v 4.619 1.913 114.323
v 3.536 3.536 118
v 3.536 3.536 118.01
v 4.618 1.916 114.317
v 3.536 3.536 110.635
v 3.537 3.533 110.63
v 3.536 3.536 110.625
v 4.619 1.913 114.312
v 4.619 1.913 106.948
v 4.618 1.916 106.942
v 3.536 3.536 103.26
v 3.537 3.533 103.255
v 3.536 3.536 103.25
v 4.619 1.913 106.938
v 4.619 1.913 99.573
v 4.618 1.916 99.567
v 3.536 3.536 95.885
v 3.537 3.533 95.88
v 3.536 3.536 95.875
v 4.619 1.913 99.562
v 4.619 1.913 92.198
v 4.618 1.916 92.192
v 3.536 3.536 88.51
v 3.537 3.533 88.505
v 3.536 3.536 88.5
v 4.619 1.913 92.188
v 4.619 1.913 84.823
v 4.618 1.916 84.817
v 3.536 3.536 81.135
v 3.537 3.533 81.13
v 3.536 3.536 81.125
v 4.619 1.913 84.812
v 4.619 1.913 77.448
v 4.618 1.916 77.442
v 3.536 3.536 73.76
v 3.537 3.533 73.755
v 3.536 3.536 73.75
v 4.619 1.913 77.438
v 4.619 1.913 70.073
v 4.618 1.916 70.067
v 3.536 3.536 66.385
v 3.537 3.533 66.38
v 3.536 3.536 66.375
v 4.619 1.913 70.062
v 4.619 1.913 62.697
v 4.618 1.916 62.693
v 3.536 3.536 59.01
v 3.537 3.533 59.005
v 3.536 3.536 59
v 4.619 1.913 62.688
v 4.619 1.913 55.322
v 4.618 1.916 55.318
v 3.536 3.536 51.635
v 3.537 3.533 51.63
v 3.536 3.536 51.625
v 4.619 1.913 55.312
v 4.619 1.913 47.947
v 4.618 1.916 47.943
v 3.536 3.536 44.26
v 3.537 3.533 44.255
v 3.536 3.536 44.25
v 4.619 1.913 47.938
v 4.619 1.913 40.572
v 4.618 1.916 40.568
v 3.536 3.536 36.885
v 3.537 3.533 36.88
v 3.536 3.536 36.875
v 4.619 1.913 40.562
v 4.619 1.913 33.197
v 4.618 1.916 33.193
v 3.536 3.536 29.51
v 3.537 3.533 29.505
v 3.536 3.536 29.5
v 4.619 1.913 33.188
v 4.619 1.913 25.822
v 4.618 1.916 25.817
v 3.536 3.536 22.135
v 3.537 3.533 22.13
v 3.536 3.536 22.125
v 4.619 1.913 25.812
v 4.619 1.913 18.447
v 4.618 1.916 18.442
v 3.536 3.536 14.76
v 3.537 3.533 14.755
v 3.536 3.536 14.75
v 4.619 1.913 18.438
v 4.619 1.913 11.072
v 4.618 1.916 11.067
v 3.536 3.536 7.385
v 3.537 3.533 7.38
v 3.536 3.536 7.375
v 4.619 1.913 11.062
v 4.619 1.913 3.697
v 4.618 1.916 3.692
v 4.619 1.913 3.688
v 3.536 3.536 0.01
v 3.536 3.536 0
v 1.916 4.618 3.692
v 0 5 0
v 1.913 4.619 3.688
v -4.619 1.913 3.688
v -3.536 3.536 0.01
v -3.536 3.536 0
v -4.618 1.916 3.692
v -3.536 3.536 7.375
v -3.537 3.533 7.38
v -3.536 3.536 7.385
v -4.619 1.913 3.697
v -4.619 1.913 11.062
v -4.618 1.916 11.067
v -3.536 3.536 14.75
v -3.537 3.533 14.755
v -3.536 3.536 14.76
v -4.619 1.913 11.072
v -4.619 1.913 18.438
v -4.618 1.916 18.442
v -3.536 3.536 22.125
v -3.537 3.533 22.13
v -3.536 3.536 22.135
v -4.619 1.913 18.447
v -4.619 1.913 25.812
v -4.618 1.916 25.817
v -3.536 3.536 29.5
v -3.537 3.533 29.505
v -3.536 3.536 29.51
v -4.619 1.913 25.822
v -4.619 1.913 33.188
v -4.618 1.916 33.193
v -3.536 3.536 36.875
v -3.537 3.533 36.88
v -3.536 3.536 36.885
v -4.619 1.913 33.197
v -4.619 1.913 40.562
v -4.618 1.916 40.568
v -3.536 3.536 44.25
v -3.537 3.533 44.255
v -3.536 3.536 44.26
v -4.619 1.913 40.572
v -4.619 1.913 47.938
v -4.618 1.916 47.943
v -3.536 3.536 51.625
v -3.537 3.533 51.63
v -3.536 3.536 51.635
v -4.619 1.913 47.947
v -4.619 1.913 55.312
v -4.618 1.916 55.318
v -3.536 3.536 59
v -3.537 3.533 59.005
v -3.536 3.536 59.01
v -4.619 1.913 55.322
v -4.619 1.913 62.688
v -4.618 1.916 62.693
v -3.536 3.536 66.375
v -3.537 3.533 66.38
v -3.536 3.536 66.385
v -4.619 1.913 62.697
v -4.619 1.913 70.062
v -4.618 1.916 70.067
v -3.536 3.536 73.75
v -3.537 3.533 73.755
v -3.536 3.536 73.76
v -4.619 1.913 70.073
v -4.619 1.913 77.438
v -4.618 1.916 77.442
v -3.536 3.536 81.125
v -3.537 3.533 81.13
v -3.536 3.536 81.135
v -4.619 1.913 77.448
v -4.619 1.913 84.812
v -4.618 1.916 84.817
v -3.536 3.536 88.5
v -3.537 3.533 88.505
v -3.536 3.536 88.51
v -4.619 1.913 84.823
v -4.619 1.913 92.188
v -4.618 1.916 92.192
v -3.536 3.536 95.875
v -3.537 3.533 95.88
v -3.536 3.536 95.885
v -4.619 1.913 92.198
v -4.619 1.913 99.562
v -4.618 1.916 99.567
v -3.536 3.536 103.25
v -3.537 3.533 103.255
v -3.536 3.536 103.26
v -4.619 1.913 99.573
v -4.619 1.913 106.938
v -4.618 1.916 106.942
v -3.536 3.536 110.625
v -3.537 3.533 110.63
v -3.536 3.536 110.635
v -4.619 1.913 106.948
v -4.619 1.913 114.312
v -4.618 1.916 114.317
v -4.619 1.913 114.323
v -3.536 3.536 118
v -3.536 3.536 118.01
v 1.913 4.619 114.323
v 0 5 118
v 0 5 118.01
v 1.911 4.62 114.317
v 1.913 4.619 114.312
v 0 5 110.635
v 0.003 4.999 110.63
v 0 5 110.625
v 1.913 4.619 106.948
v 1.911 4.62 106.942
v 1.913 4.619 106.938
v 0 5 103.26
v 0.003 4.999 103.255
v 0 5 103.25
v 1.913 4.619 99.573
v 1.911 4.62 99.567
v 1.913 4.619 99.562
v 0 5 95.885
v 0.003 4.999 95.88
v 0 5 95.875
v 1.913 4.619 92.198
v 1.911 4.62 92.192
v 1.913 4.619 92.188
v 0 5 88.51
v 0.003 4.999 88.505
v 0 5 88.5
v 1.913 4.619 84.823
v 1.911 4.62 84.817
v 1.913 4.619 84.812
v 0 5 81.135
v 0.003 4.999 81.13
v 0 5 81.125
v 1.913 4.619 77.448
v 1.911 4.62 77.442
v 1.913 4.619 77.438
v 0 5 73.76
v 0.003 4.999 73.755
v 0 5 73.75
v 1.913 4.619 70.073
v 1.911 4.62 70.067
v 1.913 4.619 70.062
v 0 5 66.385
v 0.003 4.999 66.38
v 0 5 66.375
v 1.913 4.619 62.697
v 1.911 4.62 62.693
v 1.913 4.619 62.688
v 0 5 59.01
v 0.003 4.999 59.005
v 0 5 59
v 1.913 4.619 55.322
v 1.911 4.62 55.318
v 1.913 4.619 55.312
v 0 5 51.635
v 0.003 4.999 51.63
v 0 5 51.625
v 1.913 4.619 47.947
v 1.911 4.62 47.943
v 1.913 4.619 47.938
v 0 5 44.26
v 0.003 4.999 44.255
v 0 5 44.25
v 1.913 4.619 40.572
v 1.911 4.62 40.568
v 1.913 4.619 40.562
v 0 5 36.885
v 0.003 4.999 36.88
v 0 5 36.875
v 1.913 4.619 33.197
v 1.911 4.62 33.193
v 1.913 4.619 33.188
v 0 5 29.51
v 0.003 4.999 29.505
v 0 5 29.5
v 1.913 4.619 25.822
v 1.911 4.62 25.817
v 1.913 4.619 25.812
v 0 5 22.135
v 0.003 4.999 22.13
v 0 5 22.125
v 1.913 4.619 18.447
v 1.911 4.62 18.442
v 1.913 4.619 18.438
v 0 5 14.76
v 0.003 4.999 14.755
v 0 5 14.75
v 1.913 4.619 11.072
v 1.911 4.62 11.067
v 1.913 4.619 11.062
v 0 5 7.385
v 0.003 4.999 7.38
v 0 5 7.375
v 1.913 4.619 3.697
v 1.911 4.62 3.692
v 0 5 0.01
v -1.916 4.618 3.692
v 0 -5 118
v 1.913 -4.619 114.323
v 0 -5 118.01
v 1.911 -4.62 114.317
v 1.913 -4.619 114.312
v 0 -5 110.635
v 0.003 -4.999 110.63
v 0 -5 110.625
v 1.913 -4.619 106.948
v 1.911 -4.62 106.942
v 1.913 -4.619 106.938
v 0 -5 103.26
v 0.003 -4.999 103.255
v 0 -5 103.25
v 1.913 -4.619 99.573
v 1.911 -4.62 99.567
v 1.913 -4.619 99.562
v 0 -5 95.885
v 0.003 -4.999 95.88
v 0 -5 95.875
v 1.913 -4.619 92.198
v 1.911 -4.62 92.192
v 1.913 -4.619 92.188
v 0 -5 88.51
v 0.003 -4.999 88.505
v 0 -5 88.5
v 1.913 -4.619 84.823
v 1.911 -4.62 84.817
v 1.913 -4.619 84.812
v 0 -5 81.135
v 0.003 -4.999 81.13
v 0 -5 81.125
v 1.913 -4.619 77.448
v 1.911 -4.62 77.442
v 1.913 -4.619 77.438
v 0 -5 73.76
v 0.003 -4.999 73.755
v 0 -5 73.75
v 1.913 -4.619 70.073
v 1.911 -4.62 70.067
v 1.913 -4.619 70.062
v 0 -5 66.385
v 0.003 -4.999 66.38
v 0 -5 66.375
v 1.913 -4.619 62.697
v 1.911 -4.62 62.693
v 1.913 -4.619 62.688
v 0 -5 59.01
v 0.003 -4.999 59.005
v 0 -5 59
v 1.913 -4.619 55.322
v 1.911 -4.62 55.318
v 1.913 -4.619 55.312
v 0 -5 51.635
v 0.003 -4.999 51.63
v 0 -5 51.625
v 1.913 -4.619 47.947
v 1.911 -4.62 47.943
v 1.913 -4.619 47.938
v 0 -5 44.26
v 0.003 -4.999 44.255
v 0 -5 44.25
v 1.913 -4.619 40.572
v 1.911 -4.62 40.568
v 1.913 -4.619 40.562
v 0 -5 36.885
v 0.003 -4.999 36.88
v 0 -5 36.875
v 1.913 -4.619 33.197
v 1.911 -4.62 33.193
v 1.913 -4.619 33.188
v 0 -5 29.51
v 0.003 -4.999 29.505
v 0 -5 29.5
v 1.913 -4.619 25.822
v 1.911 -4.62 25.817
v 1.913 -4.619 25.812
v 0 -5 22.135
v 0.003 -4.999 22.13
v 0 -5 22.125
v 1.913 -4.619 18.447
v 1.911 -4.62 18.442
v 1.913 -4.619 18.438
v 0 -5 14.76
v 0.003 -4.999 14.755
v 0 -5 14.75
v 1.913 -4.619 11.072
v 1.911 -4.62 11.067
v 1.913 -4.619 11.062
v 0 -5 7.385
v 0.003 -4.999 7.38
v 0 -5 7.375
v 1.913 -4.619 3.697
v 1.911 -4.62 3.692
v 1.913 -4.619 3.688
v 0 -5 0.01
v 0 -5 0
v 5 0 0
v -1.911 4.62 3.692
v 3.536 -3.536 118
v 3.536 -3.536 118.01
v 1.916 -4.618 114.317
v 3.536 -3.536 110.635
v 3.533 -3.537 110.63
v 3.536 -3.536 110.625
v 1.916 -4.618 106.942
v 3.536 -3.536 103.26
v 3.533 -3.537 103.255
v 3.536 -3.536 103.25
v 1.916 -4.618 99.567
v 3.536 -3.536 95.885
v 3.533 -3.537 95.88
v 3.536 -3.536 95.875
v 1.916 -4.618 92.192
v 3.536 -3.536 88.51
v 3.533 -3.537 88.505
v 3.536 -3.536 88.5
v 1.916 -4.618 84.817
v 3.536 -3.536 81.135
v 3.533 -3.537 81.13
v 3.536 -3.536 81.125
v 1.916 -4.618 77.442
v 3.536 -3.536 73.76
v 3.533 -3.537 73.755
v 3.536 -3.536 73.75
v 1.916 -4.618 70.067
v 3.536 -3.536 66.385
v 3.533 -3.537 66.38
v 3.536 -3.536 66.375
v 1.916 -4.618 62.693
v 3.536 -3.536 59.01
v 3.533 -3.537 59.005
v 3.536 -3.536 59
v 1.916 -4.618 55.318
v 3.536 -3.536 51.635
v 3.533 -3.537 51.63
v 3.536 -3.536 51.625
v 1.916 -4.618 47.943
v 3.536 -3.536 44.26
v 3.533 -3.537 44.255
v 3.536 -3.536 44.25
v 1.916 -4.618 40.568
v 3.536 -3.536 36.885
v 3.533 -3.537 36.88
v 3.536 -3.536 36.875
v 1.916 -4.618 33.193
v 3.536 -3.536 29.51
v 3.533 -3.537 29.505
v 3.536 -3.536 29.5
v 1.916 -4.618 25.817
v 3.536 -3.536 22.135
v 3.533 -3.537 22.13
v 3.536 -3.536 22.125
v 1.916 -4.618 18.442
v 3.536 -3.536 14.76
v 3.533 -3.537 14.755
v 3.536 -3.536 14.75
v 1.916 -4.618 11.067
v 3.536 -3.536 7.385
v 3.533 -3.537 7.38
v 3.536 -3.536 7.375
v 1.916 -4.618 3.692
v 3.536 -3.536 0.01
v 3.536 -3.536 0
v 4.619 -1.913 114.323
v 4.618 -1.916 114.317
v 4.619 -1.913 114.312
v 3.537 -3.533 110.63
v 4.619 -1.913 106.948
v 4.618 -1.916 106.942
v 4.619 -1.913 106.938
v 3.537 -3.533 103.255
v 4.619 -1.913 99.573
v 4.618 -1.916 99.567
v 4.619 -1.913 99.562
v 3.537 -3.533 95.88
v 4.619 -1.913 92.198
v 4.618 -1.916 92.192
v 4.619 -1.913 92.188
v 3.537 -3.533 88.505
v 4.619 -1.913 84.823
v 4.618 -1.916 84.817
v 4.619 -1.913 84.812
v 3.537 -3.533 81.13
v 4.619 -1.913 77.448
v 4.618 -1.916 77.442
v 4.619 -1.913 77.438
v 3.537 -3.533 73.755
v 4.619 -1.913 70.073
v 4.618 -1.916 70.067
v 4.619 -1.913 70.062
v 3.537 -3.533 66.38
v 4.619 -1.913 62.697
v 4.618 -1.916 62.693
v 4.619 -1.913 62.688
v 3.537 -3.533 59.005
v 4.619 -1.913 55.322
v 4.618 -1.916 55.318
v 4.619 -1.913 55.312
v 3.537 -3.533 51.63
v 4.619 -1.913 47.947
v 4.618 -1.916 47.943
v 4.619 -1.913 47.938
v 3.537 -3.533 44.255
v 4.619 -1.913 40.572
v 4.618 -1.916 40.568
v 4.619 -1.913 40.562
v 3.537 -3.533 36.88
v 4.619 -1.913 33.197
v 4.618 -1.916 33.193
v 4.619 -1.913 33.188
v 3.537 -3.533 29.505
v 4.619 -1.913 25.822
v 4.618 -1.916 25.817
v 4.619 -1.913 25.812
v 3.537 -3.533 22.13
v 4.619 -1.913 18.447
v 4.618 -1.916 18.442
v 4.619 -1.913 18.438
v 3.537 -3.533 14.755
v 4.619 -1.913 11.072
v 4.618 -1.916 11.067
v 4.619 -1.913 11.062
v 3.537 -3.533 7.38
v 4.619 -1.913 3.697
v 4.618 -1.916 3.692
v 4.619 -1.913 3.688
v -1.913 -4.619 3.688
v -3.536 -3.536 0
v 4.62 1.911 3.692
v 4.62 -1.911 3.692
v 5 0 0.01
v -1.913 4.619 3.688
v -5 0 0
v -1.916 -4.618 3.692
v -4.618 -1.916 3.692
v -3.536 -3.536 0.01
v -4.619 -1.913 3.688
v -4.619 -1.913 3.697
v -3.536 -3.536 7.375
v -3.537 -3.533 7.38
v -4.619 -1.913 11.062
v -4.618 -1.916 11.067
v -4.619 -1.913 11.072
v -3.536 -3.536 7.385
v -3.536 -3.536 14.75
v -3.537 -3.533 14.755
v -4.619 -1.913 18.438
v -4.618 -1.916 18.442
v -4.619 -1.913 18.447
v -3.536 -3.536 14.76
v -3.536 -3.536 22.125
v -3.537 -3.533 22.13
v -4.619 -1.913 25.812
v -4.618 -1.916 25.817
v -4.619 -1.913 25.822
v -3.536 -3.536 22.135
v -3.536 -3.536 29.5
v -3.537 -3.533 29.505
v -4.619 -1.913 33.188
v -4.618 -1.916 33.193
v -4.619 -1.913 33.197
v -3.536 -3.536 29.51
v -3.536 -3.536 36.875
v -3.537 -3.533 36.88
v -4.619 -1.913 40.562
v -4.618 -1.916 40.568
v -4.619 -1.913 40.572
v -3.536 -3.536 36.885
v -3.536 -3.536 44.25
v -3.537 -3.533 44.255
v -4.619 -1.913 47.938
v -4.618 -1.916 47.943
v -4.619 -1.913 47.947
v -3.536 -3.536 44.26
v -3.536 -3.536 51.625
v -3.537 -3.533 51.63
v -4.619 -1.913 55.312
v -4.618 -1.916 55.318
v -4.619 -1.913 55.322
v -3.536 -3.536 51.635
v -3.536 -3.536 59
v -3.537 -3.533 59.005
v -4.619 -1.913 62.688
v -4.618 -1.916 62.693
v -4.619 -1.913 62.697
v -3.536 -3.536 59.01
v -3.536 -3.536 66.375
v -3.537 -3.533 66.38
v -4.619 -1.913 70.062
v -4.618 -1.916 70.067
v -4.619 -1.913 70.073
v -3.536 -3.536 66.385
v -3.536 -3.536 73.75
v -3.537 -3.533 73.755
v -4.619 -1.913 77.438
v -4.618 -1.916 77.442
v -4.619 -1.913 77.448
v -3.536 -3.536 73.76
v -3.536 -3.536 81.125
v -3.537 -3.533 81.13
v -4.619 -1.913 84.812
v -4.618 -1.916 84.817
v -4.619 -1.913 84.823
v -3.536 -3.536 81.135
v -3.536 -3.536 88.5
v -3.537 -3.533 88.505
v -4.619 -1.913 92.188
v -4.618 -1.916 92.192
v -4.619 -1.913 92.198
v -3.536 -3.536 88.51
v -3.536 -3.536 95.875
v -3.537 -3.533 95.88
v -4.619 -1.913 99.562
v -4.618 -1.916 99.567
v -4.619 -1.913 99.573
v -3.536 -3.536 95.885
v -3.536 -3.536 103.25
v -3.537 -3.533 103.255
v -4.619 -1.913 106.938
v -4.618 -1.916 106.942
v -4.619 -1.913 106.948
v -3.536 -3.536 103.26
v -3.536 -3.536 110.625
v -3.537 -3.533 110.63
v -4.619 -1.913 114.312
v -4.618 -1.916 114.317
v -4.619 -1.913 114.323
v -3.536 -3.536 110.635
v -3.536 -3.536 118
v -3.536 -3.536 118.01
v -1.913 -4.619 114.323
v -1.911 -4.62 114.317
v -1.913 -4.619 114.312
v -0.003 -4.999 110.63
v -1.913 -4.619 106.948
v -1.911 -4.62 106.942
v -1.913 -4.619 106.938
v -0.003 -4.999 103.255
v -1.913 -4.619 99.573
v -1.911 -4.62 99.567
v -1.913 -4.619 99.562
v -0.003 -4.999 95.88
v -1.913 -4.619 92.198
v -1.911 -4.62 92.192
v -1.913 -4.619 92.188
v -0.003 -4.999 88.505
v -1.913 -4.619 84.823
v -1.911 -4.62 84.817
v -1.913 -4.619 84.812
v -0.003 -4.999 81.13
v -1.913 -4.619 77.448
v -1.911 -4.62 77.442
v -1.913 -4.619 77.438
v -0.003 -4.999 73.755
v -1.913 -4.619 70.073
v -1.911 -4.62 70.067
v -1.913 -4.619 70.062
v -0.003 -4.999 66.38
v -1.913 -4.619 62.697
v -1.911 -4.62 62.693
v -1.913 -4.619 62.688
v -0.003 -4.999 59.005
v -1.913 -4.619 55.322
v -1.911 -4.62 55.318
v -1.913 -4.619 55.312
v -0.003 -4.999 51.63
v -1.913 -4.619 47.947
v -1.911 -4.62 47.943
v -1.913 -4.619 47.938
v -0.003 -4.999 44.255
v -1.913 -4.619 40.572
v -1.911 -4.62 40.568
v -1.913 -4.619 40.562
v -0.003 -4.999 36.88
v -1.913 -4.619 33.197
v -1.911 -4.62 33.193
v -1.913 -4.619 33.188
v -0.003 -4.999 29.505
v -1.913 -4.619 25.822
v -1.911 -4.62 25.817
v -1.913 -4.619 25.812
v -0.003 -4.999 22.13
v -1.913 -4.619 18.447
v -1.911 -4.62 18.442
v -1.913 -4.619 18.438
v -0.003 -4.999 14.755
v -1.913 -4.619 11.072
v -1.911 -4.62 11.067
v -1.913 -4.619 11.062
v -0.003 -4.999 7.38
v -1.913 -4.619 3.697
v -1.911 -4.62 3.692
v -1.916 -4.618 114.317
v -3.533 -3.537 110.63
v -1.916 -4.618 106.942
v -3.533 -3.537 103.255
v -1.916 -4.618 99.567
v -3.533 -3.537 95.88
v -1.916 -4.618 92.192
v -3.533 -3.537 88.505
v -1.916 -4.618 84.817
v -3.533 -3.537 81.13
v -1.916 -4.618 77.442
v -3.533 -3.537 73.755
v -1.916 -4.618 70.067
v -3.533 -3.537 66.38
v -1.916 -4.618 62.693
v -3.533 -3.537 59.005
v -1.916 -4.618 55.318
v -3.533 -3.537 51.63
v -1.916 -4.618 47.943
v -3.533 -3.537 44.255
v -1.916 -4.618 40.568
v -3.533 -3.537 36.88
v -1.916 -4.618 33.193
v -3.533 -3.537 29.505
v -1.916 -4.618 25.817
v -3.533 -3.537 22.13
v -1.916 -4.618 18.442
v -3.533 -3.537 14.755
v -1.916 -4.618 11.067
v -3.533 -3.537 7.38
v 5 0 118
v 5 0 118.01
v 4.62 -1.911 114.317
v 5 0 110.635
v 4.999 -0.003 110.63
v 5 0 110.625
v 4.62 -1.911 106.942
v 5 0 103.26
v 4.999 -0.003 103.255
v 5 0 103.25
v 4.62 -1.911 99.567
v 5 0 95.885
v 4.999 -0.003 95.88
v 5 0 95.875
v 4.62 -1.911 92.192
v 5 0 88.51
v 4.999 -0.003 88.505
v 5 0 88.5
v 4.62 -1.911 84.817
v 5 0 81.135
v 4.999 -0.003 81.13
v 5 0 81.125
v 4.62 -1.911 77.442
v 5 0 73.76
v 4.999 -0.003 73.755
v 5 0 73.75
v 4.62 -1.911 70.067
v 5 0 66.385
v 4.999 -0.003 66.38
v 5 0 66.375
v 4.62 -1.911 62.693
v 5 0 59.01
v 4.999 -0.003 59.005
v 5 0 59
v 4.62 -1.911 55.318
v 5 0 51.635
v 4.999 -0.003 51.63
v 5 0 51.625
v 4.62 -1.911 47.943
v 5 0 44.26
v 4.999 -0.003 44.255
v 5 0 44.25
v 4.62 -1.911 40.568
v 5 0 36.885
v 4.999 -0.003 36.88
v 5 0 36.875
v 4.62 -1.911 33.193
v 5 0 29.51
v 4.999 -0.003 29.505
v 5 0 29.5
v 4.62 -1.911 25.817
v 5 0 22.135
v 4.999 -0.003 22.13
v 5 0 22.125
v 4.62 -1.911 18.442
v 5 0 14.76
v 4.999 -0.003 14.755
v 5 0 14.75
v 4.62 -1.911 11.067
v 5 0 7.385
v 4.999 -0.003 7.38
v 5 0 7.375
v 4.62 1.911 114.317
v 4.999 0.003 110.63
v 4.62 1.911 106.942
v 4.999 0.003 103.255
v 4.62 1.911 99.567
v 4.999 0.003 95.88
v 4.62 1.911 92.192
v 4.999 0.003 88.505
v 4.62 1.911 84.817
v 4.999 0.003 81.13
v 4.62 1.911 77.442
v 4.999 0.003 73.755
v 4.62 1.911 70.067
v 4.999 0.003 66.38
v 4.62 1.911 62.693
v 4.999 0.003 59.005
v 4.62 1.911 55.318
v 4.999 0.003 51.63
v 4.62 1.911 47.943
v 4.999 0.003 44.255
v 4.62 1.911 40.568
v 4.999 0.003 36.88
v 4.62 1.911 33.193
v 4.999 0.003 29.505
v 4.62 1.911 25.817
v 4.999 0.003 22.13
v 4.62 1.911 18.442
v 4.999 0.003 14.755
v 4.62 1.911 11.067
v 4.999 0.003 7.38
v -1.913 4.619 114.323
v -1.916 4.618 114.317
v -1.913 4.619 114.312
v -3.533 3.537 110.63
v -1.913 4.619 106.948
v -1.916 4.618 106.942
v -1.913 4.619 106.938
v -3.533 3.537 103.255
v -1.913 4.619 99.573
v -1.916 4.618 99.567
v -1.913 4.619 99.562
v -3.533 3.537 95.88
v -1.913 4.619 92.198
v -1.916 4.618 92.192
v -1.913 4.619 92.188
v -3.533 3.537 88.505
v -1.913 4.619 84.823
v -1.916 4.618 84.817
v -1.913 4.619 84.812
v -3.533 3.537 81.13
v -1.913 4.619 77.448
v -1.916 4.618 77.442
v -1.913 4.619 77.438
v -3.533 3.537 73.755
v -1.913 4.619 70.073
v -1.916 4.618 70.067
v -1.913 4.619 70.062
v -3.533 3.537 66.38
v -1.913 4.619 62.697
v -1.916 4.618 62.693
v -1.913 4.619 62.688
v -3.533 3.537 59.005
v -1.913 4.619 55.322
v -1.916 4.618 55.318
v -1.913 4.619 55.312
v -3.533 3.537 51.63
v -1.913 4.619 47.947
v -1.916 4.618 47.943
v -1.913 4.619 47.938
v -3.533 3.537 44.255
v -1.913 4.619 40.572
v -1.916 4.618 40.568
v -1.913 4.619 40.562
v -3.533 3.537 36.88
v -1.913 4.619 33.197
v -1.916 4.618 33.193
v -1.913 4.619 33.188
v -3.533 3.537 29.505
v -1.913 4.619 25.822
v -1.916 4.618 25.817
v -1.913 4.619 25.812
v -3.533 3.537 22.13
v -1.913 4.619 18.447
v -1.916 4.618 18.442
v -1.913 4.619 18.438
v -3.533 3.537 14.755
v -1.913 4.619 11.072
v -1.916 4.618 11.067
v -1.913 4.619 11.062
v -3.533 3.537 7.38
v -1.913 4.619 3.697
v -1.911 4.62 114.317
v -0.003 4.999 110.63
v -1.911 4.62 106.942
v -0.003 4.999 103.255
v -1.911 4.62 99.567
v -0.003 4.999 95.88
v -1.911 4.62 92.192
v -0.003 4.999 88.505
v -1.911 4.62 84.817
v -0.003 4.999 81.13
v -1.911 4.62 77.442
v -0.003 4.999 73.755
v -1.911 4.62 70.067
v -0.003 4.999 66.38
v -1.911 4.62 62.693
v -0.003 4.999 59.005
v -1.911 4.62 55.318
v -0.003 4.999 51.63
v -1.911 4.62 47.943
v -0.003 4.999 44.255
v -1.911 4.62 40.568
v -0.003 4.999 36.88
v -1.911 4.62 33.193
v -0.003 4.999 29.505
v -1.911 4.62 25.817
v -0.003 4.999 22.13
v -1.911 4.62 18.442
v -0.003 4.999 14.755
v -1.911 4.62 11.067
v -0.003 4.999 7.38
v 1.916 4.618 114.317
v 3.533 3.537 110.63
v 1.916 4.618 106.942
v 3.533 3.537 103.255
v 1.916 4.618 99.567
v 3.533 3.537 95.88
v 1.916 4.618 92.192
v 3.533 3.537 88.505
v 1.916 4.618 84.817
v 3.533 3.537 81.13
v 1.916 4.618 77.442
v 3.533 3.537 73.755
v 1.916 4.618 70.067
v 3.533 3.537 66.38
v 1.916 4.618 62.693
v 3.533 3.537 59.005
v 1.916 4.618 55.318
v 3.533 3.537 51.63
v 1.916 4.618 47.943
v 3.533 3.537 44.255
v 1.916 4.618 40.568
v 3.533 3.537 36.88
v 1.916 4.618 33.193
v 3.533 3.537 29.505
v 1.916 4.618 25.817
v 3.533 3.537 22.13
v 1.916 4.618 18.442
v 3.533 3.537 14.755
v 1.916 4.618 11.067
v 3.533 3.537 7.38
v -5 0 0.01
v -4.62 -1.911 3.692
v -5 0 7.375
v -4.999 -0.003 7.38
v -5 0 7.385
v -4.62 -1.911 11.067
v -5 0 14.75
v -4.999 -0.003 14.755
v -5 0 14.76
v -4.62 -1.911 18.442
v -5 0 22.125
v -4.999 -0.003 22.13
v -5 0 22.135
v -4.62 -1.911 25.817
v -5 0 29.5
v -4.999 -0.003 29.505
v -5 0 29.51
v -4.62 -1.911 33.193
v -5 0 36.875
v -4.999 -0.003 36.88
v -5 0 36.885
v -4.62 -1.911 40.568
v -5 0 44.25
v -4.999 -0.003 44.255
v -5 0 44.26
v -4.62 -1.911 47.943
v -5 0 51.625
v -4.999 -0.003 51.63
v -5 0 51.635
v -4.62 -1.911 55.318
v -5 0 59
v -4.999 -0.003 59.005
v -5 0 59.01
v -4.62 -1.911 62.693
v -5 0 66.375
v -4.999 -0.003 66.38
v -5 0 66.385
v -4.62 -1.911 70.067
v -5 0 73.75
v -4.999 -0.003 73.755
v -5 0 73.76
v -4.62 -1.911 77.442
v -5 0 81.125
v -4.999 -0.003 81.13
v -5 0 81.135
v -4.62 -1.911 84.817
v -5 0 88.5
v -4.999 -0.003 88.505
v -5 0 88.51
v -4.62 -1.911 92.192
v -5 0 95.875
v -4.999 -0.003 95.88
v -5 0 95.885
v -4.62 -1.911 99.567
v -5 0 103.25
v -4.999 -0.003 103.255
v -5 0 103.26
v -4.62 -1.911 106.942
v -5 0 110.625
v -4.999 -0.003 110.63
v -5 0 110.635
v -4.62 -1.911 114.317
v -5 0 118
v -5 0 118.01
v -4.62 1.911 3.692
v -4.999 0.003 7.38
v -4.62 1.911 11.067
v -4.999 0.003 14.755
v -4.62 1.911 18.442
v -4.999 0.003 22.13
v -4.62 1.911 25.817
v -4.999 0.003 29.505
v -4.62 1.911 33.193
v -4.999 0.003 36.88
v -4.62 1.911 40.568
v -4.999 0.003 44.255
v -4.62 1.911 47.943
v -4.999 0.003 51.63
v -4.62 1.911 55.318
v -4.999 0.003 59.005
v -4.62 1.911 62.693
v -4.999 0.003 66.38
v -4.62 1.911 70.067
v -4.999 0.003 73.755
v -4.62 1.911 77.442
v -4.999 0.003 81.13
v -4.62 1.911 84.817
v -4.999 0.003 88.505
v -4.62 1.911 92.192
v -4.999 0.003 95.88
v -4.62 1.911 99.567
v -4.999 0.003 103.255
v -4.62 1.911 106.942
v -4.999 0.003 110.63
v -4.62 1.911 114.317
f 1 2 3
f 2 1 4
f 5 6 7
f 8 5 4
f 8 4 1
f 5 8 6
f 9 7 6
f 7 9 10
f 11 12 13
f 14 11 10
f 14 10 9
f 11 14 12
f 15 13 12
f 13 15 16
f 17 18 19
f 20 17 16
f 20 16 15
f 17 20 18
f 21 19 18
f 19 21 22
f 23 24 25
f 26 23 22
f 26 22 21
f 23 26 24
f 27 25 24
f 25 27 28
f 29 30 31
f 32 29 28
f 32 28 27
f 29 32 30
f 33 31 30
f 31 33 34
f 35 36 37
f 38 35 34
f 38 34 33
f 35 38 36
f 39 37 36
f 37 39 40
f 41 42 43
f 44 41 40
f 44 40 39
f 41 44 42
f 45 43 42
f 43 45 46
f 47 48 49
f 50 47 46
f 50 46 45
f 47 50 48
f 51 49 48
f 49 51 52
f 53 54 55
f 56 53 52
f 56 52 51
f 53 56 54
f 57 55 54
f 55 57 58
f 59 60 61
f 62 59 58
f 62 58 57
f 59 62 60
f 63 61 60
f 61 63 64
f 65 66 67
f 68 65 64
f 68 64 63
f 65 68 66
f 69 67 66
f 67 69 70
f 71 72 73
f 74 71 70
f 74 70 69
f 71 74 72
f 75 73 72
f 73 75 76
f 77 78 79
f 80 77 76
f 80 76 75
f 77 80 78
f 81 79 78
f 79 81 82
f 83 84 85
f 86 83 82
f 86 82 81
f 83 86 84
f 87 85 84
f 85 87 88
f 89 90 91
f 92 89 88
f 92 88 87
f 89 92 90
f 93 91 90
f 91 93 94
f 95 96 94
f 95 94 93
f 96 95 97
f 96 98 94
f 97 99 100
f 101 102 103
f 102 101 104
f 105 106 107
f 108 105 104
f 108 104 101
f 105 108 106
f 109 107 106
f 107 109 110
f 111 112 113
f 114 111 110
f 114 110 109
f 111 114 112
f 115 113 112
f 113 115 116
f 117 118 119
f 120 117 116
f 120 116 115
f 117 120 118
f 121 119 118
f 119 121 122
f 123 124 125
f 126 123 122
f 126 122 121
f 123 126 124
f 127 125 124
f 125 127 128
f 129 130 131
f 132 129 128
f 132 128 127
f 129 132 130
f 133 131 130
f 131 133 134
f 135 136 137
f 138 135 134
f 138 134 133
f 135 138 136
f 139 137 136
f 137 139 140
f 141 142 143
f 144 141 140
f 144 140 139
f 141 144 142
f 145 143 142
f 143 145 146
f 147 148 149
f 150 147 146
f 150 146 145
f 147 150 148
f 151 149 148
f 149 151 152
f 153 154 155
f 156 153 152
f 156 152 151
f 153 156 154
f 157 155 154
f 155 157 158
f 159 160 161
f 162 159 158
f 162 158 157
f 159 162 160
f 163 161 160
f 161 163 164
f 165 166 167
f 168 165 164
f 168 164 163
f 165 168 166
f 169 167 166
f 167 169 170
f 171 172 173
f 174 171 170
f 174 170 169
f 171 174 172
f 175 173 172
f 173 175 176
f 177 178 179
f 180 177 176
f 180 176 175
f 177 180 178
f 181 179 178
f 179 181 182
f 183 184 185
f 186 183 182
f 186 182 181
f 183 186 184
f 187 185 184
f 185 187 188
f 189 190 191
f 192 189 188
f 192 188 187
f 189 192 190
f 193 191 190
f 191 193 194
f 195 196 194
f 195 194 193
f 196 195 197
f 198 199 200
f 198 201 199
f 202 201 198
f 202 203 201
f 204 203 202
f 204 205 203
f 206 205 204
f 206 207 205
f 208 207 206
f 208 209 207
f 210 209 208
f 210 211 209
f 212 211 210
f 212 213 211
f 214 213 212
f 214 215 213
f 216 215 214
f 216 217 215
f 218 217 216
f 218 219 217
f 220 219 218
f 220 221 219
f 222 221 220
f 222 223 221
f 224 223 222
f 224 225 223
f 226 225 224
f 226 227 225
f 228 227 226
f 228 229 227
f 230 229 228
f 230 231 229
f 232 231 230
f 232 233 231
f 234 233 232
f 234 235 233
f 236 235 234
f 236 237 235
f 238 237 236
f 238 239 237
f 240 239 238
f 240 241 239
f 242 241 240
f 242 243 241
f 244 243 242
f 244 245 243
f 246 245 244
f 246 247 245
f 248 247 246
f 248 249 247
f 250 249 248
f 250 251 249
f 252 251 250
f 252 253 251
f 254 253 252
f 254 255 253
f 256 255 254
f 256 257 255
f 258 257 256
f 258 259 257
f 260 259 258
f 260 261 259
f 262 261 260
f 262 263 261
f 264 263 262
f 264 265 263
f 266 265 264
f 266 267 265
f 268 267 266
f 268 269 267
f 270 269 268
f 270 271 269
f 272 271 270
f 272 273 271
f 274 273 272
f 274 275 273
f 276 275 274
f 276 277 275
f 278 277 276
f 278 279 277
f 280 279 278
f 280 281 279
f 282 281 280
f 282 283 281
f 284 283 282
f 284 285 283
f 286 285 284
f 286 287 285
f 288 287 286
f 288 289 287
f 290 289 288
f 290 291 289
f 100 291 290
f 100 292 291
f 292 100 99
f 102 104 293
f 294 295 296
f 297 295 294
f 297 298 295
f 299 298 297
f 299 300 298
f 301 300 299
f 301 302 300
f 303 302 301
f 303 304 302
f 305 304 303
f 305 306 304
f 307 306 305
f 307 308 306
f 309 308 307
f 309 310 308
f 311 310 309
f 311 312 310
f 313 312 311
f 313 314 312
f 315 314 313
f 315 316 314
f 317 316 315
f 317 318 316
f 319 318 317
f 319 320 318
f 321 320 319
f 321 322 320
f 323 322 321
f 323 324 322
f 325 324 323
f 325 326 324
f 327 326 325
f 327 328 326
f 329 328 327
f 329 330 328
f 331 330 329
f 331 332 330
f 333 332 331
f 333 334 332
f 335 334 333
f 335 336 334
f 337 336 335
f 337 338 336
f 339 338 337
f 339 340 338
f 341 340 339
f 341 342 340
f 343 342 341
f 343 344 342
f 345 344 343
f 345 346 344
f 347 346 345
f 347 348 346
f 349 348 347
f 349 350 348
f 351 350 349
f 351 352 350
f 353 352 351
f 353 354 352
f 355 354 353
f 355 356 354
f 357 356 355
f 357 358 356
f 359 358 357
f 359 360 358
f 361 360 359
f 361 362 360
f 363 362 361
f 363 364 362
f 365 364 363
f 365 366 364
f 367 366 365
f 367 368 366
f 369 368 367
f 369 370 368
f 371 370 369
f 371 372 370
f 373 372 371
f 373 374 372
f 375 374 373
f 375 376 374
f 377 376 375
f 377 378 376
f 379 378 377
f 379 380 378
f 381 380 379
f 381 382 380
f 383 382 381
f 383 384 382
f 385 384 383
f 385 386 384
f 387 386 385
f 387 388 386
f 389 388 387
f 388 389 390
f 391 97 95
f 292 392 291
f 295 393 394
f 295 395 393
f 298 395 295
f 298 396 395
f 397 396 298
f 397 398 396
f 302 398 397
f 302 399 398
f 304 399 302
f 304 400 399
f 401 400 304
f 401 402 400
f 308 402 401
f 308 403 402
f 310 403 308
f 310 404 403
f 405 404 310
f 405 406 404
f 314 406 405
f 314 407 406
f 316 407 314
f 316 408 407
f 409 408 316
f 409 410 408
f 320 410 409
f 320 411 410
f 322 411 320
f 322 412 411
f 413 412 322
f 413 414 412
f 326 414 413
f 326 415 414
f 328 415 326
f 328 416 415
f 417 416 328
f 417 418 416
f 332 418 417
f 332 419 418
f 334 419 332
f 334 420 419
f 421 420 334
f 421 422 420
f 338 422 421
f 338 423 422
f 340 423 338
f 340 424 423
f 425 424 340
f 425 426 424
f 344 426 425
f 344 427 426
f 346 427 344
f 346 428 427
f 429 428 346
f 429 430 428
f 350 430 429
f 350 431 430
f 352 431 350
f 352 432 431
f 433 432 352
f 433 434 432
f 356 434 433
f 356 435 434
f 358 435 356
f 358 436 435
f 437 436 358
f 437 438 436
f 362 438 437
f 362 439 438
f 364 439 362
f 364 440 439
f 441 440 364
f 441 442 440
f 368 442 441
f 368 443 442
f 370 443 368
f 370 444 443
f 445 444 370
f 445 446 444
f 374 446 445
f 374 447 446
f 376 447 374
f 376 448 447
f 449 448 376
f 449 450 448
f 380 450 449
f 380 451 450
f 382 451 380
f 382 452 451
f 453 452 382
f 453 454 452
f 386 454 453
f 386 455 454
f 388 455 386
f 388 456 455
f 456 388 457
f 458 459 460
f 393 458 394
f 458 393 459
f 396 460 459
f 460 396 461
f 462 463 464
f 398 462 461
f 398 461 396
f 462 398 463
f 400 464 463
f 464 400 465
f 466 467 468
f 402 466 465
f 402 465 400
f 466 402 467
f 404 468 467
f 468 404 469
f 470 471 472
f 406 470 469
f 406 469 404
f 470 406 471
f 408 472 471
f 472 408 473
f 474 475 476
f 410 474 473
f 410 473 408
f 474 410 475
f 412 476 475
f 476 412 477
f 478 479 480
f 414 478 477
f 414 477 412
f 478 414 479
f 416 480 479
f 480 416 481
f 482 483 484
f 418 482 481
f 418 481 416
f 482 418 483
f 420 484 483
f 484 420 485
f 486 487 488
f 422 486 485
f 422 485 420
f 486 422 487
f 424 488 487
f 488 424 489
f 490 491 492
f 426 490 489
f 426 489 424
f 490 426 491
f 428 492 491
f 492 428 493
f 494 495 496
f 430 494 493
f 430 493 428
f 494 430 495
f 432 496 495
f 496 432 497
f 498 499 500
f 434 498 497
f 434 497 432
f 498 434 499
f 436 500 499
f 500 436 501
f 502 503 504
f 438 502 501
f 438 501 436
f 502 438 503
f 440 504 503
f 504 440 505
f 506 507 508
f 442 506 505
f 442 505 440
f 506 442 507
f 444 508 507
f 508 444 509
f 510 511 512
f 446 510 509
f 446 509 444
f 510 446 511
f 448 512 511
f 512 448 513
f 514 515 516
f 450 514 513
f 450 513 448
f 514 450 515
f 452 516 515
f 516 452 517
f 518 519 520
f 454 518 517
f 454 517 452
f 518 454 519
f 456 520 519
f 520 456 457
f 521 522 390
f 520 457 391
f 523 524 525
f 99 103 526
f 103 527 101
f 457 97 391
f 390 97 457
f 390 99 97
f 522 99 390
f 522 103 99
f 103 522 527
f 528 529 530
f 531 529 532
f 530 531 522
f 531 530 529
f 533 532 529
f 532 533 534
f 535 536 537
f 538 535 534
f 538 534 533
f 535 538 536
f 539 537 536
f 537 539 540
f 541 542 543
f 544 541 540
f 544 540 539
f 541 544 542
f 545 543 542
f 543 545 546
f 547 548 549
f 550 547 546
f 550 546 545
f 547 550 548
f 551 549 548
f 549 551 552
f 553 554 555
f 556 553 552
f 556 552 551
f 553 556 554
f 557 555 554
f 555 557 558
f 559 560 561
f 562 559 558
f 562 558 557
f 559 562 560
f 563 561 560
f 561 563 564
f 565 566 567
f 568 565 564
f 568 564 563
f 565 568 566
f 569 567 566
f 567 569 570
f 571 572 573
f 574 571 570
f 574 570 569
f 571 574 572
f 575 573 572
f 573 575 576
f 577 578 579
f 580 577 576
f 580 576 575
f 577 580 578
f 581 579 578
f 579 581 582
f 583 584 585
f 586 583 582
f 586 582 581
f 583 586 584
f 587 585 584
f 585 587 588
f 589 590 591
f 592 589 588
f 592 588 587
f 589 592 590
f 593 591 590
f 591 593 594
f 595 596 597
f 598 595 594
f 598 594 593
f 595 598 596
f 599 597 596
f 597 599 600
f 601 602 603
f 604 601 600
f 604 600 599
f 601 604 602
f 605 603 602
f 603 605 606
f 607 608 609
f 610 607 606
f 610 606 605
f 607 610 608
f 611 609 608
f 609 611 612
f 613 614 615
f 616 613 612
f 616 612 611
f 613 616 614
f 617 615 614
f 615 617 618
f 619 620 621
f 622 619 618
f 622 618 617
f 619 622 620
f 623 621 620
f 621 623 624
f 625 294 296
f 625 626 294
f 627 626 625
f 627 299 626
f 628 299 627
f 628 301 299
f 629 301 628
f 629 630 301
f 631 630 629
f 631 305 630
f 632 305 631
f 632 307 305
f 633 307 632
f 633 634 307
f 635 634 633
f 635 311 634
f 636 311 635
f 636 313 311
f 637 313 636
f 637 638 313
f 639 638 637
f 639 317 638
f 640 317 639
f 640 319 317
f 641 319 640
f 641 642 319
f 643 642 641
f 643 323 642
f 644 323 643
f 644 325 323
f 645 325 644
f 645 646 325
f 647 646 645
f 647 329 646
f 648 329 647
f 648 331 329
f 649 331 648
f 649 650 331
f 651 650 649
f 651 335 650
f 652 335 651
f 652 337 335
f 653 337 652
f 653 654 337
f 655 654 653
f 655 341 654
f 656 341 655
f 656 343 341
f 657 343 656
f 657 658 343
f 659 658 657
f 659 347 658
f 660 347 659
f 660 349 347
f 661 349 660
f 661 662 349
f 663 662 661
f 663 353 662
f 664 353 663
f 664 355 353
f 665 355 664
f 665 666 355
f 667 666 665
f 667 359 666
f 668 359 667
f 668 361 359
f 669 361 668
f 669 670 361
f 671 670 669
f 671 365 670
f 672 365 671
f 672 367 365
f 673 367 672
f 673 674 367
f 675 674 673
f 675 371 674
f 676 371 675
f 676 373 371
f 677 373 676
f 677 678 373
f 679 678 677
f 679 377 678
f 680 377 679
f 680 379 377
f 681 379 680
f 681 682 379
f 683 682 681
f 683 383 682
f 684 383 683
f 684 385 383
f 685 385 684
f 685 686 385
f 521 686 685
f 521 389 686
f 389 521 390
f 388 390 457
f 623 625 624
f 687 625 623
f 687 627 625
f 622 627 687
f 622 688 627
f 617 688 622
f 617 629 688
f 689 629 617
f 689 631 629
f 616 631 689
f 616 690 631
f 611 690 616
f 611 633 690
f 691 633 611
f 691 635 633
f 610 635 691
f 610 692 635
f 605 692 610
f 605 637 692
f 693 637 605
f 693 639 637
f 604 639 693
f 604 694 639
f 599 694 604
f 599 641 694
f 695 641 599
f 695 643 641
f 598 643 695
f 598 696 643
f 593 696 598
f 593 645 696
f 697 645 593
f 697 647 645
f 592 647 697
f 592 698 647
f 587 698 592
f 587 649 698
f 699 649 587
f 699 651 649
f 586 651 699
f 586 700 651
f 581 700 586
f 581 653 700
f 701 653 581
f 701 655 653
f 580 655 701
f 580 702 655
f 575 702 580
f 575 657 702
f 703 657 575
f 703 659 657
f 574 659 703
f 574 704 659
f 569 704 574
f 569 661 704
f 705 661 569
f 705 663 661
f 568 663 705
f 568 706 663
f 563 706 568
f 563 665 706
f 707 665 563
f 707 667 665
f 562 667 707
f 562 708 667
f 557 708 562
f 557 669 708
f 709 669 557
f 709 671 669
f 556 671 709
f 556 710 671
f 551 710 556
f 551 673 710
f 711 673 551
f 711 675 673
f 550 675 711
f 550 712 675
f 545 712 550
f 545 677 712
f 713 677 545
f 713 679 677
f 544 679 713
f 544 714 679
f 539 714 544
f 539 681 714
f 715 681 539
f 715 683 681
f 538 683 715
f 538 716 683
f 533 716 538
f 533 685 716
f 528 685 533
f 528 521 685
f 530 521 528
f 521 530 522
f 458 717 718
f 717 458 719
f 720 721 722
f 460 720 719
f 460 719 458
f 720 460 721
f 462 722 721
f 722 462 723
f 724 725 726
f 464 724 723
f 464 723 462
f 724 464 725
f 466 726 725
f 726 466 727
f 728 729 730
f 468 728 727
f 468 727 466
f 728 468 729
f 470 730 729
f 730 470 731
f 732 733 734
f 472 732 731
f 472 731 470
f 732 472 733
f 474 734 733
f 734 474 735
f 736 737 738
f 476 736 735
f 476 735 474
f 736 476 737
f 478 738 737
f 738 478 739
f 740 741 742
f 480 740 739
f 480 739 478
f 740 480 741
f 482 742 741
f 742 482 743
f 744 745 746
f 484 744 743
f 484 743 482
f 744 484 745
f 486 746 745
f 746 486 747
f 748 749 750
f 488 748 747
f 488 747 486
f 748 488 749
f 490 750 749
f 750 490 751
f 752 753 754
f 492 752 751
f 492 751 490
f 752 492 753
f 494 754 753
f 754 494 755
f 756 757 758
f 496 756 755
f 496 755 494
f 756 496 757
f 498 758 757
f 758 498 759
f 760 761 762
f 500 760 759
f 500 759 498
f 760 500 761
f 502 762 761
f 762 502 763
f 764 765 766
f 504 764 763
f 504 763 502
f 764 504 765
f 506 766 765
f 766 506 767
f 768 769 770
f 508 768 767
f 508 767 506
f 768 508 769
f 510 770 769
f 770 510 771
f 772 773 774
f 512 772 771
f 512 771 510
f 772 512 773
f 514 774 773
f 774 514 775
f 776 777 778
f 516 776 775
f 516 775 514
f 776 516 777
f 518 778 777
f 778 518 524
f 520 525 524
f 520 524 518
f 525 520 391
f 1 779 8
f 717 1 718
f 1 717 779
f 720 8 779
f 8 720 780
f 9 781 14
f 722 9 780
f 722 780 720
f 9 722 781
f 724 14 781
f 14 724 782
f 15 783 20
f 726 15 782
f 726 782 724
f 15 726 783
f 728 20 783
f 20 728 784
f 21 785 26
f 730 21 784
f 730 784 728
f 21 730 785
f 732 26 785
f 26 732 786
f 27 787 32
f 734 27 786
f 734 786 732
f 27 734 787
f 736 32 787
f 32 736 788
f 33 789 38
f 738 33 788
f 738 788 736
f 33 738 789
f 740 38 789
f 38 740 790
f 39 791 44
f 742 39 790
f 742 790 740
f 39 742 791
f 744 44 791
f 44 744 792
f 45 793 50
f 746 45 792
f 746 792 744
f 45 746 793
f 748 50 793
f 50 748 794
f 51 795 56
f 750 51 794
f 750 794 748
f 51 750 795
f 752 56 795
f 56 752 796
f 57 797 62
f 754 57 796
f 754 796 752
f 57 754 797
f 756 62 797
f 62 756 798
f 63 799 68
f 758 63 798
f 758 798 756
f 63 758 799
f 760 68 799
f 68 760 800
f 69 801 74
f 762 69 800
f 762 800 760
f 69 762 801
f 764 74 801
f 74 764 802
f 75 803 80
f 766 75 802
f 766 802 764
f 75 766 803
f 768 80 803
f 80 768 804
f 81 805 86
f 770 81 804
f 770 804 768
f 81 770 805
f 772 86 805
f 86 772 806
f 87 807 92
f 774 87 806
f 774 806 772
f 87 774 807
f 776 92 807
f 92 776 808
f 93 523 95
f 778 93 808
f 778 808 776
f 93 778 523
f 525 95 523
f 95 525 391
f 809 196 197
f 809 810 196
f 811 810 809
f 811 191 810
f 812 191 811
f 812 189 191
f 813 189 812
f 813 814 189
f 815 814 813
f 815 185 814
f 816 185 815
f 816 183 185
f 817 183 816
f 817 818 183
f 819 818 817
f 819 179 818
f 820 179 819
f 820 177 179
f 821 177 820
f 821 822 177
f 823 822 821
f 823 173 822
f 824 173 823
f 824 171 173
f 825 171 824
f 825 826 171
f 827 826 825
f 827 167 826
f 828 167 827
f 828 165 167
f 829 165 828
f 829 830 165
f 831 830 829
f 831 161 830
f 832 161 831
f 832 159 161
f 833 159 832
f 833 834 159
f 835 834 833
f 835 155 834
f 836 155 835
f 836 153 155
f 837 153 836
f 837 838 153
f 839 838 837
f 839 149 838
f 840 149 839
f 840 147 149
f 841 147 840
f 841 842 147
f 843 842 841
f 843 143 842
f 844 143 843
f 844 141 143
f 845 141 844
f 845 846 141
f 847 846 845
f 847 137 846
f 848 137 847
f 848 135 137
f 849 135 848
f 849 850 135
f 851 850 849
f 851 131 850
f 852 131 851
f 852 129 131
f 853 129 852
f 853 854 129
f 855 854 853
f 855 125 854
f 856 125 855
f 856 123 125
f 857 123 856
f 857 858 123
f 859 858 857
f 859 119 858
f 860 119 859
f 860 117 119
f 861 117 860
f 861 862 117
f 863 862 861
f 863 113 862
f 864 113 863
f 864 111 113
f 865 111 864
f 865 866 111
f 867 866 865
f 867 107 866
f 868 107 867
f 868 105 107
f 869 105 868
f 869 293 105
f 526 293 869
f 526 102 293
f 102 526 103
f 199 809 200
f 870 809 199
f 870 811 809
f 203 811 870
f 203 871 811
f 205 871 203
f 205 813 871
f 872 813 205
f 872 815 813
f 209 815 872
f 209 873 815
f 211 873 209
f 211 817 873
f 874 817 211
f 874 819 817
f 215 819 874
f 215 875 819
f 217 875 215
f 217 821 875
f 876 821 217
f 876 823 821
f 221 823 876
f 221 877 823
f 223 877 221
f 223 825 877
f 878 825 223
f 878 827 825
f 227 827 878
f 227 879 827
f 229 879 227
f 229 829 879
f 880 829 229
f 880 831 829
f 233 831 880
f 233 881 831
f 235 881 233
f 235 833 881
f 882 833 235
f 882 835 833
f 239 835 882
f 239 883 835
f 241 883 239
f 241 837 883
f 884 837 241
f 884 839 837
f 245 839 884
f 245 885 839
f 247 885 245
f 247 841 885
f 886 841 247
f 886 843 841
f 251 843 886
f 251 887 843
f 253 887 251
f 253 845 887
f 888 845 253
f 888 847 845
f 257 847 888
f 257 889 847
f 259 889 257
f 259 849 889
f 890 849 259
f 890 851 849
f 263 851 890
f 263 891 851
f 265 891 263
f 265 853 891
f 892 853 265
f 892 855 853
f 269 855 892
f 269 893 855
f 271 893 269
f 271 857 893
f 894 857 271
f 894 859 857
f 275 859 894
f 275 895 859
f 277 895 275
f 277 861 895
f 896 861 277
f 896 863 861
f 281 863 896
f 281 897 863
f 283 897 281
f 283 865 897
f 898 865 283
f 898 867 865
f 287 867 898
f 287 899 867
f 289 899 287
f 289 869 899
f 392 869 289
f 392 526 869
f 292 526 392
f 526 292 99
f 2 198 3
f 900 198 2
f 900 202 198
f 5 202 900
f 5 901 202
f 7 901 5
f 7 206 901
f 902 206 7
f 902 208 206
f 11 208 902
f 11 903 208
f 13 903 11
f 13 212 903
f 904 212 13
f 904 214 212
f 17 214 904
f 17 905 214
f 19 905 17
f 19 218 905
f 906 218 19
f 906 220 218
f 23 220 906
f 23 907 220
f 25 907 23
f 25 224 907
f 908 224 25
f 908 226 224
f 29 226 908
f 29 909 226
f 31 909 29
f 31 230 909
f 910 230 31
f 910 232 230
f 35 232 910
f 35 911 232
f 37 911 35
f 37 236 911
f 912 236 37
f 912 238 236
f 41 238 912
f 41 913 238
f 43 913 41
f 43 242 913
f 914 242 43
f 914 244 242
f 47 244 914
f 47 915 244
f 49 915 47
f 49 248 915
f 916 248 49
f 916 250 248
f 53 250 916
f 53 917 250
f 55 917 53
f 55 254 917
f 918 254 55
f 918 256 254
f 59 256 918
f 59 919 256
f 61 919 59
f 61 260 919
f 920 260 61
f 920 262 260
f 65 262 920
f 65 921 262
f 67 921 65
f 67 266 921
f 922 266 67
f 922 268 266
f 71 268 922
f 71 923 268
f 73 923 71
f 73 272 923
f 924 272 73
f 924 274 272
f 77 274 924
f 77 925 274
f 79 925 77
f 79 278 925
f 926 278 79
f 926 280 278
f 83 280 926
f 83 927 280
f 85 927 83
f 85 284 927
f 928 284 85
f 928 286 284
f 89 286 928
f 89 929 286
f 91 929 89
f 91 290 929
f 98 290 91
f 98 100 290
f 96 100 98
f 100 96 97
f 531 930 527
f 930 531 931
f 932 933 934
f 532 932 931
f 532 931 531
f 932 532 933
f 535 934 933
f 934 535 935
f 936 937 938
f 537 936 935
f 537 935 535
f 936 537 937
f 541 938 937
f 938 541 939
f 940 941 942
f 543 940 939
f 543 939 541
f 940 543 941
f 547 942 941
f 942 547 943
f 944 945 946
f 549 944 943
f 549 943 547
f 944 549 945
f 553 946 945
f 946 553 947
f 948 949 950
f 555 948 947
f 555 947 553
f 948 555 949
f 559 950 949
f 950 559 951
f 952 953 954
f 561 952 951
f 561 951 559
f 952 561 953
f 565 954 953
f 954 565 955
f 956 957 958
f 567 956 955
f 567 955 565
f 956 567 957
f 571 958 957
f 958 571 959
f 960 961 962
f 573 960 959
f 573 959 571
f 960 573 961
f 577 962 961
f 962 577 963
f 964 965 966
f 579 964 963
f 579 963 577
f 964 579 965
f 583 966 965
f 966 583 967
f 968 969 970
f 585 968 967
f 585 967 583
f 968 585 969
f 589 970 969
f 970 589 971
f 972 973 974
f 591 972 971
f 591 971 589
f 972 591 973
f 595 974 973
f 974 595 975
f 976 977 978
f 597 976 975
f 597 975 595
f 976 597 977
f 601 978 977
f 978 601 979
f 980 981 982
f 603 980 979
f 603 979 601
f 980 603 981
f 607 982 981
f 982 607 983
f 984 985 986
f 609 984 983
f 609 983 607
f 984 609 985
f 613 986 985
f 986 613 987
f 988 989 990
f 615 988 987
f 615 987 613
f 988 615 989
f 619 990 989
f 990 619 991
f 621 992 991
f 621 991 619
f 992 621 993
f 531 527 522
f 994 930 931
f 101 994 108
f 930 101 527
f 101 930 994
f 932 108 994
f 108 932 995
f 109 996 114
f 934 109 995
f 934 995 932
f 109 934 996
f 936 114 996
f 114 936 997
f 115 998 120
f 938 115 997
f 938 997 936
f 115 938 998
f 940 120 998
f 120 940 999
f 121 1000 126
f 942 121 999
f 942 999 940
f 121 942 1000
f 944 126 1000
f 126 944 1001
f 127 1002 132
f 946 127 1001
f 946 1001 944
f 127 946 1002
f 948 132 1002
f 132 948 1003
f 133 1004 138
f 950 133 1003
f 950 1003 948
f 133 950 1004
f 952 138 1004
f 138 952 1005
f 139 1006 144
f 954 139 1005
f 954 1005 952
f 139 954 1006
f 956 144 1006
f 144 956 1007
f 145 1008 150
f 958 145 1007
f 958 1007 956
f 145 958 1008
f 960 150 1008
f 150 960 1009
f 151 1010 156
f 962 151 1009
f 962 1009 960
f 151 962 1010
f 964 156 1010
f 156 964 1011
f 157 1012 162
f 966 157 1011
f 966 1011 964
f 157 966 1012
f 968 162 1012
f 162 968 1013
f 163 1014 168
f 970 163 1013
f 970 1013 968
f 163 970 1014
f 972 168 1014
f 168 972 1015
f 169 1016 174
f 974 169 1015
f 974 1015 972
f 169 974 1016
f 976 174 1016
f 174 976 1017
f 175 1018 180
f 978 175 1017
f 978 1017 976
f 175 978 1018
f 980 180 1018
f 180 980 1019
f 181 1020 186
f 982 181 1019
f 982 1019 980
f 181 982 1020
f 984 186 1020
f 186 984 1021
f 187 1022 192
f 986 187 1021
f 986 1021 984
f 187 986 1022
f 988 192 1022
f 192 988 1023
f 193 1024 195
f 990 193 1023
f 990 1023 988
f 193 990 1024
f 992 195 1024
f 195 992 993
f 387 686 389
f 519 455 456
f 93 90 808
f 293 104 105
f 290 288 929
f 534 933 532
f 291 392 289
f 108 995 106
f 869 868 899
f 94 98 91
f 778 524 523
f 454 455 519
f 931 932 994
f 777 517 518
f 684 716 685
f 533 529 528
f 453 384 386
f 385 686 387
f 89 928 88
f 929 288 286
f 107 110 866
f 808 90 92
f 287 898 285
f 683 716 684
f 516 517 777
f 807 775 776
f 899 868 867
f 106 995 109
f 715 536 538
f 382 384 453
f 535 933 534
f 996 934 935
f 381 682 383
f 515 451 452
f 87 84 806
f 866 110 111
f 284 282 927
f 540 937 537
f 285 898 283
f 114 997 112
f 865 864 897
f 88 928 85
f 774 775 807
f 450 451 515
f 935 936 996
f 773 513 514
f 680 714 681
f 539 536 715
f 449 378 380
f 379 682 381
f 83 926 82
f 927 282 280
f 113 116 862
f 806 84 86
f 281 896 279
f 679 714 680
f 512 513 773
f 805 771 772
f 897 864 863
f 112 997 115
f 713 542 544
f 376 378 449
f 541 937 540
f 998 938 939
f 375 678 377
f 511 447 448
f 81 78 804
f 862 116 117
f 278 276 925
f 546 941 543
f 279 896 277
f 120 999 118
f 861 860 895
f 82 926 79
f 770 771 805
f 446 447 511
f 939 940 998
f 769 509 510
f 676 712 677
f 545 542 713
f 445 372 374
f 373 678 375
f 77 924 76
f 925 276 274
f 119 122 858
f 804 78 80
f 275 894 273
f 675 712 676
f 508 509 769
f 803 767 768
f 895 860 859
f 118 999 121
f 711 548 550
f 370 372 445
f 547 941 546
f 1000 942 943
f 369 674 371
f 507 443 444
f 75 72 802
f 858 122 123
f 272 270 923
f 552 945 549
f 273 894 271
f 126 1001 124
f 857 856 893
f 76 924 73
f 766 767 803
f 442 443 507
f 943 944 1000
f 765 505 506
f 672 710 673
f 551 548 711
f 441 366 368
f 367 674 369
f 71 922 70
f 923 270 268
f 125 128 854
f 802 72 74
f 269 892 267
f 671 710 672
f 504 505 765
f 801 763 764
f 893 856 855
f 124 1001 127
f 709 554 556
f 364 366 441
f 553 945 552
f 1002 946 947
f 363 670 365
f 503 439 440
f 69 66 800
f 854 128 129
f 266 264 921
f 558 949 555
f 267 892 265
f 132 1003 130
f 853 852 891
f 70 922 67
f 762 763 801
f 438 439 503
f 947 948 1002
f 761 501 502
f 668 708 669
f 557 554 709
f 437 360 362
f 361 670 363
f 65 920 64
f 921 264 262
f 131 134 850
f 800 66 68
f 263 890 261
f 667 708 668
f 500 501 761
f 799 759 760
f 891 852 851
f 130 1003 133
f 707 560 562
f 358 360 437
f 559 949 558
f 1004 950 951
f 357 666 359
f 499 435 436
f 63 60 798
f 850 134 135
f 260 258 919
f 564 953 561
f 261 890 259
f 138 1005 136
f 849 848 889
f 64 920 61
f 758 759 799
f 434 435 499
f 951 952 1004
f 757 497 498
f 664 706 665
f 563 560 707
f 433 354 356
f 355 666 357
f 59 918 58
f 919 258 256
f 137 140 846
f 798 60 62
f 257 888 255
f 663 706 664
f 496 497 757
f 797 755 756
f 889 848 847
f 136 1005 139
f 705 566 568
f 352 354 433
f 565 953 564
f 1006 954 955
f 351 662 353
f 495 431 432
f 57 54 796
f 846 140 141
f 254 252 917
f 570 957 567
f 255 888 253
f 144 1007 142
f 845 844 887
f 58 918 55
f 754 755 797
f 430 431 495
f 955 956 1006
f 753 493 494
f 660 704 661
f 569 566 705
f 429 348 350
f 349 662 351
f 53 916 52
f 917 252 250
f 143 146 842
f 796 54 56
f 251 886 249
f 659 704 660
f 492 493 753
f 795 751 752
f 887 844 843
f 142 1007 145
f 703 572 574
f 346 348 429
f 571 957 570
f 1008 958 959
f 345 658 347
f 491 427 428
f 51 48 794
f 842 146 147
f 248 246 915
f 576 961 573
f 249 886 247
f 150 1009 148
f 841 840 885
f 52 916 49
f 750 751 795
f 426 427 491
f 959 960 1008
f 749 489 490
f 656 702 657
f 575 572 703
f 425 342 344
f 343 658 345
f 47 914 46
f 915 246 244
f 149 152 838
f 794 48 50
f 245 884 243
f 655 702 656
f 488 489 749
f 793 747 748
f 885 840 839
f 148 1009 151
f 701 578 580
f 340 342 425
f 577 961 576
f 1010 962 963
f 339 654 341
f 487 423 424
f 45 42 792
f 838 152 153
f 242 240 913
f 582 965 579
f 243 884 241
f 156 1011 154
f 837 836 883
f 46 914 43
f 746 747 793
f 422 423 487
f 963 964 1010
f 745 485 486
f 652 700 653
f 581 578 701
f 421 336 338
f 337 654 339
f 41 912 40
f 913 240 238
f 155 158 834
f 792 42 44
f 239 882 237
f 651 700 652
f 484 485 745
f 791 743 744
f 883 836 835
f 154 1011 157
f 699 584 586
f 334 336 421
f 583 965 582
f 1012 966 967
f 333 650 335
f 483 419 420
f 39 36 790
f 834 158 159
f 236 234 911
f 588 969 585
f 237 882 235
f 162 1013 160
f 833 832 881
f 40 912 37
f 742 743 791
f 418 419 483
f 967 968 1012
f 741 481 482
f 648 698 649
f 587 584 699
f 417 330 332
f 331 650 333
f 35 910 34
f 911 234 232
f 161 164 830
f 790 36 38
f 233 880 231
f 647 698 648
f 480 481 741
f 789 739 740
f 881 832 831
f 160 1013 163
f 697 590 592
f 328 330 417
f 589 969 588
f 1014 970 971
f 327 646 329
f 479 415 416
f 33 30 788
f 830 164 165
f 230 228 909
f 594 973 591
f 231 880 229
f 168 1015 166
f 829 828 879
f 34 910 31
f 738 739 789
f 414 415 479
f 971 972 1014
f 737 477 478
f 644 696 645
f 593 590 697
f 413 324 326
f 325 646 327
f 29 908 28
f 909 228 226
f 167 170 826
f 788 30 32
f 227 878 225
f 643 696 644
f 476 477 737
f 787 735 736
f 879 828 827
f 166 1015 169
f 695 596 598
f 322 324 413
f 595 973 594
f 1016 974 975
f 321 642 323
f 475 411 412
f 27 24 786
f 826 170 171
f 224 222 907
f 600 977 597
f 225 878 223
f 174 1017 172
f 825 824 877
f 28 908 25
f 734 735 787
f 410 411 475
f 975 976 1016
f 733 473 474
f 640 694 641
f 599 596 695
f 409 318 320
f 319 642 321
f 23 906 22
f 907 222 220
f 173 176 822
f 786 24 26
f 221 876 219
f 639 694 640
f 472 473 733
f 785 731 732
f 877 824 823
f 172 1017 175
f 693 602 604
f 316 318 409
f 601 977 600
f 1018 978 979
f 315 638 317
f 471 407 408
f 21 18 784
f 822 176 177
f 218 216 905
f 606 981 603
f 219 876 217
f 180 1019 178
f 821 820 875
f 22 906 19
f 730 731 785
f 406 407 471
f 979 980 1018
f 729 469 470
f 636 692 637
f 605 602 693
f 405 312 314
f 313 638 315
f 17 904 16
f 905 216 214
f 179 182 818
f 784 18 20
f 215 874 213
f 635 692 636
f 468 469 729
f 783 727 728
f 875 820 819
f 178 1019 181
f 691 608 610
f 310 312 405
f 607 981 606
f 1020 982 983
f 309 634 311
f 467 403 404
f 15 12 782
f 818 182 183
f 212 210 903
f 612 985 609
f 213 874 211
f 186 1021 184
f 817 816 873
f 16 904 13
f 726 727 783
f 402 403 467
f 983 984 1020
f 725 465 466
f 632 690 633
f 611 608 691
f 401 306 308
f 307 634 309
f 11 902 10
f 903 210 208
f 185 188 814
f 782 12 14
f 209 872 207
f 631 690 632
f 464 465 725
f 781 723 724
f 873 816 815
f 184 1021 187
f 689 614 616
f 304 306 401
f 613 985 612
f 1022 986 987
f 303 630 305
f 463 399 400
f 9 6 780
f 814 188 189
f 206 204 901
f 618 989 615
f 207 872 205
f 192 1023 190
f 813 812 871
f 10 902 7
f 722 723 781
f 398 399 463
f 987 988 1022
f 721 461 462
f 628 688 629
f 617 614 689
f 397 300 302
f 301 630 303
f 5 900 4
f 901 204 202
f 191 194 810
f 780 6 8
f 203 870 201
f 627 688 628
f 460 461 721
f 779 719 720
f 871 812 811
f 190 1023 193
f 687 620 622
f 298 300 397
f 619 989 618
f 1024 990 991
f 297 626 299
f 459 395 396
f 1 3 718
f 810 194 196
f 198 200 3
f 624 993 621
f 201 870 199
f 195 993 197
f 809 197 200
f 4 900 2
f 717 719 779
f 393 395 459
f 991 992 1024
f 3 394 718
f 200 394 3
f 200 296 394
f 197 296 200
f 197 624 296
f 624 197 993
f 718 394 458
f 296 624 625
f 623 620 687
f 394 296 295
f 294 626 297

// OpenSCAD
//external diameter
diameter=10;
height=118;
//N of polygon sides
faces=8;
//vertical subdivisions
segments=32;
//walls and base thickness
wall=3;
hollow=false; // [true,false]

module twisted_vase(diameter,height,faces,segments,wall,hollow) {
	
	e=.01;
	
	difference() {
		for(i=[0:segments-1]) 
			hull() {
				translate([0,0,height/segments*i])
					rotate([0,0,180/faces*(i%2)])
						cylinder(d=diameter, h=e, $fn=faces);
				translate([0,0,height/segments*(i+1)])
					rotate([0,0,180/faces*((i+1)%2)])
						cylinder(d=diameter, h=e, $fn=faces);
		}
		if(hollow)
			for(i=[0:segments-1]) 
				hull() {
					translate([0,0,height/segments*i])
						rotate([0,0,180/faces*(i%2)])
							cylinder(d=diameter-wall*2, h=e*2, $fn=faces);
					translate([0,0,height/segments*(i+1)])
						rotate([0,0,180/faces*((i+1)%2)])
							cylinder(d=diameter-wall*2, h=e*2, $fn=faces);
			}	
	}
	if(hollow) cylinder(d=diameter-wall*2+e, h=wall, $fn=faces);

}

twisted_vase(diameter,height,faces,segments,wall,hollow);
